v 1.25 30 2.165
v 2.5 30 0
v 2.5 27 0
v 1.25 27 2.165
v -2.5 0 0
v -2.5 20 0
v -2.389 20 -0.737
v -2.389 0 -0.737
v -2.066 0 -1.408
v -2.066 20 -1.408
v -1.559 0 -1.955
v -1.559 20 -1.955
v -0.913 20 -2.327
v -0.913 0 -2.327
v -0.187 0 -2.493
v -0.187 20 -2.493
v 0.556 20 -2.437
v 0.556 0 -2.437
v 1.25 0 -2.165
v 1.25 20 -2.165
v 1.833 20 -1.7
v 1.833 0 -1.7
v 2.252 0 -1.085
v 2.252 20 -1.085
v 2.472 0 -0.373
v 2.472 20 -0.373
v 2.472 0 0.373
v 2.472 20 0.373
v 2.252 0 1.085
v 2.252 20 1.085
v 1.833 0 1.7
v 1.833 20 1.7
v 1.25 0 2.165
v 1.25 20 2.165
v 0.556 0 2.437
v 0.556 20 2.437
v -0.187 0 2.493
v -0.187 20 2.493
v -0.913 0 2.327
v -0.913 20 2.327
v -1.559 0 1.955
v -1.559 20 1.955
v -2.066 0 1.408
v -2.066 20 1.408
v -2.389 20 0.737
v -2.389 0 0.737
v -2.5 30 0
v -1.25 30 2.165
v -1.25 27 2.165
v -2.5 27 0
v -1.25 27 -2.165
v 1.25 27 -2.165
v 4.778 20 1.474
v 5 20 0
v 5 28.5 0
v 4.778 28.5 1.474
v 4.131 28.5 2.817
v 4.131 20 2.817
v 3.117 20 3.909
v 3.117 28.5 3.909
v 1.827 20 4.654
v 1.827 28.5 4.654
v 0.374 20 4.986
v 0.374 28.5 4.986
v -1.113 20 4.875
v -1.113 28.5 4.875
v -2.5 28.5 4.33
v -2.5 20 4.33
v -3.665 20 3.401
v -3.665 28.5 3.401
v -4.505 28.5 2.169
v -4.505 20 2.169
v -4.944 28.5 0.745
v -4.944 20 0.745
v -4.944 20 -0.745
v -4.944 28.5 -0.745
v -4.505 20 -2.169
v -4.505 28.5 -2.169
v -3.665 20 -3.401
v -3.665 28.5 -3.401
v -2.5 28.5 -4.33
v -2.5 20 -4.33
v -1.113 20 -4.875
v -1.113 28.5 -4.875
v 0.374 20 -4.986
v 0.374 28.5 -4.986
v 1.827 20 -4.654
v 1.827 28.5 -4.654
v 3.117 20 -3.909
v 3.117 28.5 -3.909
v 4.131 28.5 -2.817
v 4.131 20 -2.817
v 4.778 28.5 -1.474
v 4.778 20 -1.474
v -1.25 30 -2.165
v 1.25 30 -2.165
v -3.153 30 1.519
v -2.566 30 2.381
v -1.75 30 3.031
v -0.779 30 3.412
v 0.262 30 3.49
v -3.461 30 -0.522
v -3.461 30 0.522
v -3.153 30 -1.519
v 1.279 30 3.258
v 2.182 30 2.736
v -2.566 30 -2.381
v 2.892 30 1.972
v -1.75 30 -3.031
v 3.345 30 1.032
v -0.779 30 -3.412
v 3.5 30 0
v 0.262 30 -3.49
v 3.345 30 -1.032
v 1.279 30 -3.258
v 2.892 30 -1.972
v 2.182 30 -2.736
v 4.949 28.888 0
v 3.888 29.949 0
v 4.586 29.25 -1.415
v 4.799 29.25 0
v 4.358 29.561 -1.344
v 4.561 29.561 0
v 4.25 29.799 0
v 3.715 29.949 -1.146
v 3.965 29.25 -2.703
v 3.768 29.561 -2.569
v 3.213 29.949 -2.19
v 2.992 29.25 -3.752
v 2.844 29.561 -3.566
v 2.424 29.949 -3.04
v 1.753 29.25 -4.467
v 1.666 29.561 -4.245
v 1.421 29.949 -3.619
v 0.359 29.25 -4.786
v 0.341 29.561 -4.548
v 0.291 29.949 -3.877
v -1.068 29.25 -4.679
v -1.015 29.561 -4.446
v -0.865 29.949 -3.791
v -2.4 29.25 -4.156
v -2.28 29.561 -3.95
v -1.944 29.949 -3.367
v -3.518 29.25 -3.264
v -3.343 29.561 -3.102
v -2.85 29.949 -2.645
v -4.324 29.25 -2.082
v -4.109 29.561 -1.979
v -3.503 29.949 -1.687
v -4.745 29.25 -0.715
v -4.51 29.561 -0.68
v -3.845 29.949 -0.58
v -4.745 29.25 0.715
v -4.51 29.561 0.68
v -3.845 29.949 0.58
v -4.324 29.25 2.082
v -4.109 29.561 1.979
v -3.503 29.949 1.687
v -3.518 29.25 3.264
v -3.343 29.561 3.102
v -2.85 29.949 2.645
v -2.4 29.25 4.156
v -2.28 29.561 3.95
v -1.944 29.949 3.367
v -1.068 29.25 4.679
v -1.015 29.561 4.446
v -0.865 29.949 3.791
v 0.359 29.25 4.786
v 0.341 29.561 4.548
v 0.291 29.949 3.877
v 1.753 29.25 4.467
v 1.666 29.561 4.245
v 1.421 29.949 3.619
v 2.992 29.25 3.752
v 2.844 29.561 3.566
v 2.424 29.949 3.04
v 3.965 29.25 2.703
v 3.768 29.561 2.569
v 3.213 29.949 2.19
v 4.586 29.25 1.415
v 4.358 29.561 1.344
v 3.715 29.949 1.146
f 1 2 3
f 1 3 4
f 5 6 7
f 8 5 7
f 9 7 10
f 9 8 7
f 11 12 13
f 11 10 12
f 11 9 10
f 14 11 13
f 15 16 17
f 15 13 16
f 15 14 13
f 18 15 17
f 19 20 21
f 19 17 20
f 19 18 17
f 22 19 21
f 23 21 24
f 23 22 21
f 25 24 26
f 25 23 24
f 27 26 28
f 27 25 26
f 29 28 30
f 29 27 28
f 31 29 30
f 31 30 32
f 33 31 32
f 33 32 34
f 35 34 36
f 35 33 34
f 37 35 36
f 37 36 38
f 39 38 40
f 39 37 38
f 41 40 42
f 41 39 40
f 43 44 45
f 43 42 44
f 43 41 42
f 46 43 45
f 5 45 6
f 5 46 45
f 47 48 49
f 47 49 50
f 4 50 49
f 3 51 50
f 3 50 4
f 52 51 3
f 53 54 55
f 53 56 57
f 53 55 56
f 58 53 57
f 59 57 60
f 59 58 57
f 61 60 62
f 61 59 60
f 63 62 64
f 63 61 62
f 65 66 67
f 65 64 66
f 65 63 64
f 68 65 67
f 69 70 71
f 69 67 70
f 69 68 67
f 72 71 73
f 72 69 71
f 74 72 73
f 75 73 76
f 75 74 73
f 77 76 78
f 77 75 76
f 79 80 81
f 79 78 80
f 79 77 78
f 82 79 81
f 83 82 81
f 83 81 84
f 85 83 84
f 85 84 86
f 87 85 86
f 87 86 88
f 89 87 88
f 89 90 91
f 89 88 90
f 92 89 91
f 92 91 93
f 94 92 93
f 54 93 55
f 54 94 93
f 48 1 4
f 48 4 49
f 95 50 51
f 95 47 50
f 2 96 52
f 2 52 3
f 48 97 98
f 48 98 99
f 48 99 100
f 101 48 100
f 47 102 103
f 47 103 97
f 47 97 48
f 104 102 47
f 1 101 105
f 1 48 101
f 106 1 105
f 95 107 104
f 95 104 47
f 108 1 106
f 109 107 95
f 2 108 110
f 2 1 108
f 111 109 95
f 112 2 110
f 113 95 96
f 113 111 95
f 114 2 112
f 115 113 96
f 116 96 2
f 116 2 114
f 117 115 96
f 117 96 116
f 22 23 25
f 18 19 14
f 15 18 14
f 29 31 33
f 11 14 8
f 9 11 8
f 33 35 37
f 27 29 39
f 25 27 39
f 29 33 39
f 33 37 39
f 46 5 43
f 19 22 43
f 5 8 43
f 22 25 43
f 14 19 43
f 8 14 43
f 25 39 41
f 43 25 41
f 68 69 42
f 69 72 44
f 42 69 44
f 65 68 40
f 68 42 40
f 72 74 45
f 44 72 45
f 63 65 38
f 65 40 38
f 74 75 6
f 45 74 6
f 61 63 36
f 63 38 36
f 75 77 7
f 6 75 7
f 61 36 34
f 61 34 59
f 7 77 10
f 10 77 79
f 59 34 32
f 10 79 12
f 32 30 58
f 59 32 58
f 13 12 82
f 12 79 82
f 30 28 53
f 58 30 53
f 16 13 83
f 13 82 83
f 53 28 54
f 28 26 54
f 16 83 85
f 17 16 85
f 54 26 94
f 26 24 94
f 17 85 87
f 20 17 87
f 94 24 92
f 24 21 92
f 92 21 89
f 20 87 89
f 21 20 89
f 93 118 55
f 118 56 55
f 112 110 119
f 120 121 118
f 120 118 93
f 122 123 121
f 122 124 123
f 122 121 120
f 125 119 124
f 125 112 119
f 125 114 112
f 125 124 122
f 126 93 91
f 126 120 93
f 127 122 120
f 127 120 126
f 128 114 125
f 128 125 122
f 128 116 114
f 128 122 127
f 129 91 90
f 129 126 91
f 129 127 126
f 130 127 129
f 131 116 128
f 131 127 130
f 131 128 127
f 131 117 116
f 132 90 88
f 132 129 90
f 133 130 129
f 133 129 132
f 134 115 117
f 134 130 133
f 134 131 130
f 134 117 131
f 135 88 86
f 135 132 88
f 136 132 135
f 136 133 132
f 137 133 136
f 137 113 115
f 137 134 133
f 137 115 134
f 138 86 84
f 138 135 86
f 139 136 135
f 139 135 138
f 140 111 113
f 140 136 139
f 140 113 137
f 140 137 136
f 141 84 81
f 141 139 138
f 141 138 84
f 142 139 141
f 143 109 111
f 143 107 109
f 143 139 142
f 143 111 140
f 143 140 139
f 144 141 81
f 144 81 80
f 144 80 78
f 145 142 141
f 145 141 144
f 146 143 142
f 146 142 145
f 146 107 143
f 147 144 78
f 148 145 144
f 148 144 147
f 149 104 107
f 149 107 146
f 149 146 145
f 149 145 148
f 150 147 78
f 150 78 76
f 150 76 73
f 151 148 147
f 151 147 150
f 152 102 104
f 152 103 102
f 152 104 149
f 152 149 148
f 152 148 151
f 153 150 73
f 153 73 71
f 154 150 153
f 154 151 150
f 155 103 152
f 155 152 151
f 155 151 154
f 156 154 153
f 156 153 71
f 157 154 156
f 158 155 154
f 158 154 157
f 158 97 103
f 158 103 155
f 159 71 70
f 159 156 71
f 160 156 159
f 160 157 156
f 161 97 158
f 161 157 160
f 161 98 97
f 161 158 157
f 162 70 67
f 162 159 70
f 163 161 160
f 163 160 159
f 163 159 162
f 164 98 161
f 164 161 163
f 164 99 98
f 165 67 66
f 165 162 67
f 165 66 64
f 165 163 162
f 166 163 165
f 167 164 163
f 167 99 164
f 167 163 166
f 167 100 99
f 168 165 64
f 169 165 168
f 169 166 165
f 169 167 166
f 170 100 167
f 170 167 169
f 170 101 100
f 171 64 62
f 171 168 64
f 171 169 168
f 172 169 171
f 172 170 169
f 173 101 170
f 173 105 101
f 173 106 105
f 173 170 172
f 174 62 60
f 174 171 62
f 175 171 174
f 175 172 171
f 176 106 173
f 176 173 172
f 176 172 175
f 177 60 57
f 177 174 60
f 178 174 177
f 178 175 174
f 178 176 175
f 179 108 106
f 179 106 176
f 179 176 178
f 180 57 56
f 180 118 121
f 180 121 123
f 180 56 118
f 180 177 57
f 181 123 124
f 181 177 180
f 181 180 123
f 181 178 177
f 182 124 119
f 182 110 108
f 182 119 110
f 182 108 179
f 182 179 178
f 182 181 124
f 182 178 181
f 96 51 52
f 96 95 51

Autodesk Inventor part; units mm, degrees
ref_plane "YZ Plane" through (0, 0, 0) normal (1, 0, 0) x (0, 1, 0)
ref_plane "XZ Plane" through (0, 0, 0) normal (0, 1, 0) x (-1, 0, 0)
ref_plane "XY Plane" through (0, 0, 0) normal (0, 0, 1) x (1, 0, 0)
sketch "Sketch1" plane through (0, 0, 0) normal (0, 1, 0) x (-1, 0, 0)
  circle A0 centre (0, 0) radius 2.5
  dimension "d0" = 5
extrude "Extrusion1" add sketch "Sketch1" along normal blind 20
sketch "Sketch2" plane through (0, 20, 0) normal (0, 1, 0) x (1, 0, 0)
  circle A0 centre (0, 0) radius 5
extrude "Extrusion2" add sketch "Sketch2" along normal blind 10
sketch "Sketch3" plane through (0, 30, 0) normal (0, 1, 0) x (1, 0, 0)
  circle A0 centre (0, 0) radius 2.5 projected
  line L0 (2.5, 0) -> (1.25, -2.1651)
  line L1 (1.25, -2.1651) -> (-1.25, -2.1651)
  line L2 (-1.25, -2.1651) -> (-2.5, 0)
  line L3 (-2.5, 0) -> (-1.25, 2.1651)
  line L4 (-1.25, 2.1651) -> (1.25, 2.1651)
  line L5 (1.25, 2.1651) -> (2.5, 0)
fillet "Fillet1" radius 1.5 1 edges at (-5, 30, 0)
extrude "Extrusion3" cut sketch "Sketch3" against normal blind 3 contours L0 L1 L2 L3 L4 L5
properties part number "35mm_bolt"
